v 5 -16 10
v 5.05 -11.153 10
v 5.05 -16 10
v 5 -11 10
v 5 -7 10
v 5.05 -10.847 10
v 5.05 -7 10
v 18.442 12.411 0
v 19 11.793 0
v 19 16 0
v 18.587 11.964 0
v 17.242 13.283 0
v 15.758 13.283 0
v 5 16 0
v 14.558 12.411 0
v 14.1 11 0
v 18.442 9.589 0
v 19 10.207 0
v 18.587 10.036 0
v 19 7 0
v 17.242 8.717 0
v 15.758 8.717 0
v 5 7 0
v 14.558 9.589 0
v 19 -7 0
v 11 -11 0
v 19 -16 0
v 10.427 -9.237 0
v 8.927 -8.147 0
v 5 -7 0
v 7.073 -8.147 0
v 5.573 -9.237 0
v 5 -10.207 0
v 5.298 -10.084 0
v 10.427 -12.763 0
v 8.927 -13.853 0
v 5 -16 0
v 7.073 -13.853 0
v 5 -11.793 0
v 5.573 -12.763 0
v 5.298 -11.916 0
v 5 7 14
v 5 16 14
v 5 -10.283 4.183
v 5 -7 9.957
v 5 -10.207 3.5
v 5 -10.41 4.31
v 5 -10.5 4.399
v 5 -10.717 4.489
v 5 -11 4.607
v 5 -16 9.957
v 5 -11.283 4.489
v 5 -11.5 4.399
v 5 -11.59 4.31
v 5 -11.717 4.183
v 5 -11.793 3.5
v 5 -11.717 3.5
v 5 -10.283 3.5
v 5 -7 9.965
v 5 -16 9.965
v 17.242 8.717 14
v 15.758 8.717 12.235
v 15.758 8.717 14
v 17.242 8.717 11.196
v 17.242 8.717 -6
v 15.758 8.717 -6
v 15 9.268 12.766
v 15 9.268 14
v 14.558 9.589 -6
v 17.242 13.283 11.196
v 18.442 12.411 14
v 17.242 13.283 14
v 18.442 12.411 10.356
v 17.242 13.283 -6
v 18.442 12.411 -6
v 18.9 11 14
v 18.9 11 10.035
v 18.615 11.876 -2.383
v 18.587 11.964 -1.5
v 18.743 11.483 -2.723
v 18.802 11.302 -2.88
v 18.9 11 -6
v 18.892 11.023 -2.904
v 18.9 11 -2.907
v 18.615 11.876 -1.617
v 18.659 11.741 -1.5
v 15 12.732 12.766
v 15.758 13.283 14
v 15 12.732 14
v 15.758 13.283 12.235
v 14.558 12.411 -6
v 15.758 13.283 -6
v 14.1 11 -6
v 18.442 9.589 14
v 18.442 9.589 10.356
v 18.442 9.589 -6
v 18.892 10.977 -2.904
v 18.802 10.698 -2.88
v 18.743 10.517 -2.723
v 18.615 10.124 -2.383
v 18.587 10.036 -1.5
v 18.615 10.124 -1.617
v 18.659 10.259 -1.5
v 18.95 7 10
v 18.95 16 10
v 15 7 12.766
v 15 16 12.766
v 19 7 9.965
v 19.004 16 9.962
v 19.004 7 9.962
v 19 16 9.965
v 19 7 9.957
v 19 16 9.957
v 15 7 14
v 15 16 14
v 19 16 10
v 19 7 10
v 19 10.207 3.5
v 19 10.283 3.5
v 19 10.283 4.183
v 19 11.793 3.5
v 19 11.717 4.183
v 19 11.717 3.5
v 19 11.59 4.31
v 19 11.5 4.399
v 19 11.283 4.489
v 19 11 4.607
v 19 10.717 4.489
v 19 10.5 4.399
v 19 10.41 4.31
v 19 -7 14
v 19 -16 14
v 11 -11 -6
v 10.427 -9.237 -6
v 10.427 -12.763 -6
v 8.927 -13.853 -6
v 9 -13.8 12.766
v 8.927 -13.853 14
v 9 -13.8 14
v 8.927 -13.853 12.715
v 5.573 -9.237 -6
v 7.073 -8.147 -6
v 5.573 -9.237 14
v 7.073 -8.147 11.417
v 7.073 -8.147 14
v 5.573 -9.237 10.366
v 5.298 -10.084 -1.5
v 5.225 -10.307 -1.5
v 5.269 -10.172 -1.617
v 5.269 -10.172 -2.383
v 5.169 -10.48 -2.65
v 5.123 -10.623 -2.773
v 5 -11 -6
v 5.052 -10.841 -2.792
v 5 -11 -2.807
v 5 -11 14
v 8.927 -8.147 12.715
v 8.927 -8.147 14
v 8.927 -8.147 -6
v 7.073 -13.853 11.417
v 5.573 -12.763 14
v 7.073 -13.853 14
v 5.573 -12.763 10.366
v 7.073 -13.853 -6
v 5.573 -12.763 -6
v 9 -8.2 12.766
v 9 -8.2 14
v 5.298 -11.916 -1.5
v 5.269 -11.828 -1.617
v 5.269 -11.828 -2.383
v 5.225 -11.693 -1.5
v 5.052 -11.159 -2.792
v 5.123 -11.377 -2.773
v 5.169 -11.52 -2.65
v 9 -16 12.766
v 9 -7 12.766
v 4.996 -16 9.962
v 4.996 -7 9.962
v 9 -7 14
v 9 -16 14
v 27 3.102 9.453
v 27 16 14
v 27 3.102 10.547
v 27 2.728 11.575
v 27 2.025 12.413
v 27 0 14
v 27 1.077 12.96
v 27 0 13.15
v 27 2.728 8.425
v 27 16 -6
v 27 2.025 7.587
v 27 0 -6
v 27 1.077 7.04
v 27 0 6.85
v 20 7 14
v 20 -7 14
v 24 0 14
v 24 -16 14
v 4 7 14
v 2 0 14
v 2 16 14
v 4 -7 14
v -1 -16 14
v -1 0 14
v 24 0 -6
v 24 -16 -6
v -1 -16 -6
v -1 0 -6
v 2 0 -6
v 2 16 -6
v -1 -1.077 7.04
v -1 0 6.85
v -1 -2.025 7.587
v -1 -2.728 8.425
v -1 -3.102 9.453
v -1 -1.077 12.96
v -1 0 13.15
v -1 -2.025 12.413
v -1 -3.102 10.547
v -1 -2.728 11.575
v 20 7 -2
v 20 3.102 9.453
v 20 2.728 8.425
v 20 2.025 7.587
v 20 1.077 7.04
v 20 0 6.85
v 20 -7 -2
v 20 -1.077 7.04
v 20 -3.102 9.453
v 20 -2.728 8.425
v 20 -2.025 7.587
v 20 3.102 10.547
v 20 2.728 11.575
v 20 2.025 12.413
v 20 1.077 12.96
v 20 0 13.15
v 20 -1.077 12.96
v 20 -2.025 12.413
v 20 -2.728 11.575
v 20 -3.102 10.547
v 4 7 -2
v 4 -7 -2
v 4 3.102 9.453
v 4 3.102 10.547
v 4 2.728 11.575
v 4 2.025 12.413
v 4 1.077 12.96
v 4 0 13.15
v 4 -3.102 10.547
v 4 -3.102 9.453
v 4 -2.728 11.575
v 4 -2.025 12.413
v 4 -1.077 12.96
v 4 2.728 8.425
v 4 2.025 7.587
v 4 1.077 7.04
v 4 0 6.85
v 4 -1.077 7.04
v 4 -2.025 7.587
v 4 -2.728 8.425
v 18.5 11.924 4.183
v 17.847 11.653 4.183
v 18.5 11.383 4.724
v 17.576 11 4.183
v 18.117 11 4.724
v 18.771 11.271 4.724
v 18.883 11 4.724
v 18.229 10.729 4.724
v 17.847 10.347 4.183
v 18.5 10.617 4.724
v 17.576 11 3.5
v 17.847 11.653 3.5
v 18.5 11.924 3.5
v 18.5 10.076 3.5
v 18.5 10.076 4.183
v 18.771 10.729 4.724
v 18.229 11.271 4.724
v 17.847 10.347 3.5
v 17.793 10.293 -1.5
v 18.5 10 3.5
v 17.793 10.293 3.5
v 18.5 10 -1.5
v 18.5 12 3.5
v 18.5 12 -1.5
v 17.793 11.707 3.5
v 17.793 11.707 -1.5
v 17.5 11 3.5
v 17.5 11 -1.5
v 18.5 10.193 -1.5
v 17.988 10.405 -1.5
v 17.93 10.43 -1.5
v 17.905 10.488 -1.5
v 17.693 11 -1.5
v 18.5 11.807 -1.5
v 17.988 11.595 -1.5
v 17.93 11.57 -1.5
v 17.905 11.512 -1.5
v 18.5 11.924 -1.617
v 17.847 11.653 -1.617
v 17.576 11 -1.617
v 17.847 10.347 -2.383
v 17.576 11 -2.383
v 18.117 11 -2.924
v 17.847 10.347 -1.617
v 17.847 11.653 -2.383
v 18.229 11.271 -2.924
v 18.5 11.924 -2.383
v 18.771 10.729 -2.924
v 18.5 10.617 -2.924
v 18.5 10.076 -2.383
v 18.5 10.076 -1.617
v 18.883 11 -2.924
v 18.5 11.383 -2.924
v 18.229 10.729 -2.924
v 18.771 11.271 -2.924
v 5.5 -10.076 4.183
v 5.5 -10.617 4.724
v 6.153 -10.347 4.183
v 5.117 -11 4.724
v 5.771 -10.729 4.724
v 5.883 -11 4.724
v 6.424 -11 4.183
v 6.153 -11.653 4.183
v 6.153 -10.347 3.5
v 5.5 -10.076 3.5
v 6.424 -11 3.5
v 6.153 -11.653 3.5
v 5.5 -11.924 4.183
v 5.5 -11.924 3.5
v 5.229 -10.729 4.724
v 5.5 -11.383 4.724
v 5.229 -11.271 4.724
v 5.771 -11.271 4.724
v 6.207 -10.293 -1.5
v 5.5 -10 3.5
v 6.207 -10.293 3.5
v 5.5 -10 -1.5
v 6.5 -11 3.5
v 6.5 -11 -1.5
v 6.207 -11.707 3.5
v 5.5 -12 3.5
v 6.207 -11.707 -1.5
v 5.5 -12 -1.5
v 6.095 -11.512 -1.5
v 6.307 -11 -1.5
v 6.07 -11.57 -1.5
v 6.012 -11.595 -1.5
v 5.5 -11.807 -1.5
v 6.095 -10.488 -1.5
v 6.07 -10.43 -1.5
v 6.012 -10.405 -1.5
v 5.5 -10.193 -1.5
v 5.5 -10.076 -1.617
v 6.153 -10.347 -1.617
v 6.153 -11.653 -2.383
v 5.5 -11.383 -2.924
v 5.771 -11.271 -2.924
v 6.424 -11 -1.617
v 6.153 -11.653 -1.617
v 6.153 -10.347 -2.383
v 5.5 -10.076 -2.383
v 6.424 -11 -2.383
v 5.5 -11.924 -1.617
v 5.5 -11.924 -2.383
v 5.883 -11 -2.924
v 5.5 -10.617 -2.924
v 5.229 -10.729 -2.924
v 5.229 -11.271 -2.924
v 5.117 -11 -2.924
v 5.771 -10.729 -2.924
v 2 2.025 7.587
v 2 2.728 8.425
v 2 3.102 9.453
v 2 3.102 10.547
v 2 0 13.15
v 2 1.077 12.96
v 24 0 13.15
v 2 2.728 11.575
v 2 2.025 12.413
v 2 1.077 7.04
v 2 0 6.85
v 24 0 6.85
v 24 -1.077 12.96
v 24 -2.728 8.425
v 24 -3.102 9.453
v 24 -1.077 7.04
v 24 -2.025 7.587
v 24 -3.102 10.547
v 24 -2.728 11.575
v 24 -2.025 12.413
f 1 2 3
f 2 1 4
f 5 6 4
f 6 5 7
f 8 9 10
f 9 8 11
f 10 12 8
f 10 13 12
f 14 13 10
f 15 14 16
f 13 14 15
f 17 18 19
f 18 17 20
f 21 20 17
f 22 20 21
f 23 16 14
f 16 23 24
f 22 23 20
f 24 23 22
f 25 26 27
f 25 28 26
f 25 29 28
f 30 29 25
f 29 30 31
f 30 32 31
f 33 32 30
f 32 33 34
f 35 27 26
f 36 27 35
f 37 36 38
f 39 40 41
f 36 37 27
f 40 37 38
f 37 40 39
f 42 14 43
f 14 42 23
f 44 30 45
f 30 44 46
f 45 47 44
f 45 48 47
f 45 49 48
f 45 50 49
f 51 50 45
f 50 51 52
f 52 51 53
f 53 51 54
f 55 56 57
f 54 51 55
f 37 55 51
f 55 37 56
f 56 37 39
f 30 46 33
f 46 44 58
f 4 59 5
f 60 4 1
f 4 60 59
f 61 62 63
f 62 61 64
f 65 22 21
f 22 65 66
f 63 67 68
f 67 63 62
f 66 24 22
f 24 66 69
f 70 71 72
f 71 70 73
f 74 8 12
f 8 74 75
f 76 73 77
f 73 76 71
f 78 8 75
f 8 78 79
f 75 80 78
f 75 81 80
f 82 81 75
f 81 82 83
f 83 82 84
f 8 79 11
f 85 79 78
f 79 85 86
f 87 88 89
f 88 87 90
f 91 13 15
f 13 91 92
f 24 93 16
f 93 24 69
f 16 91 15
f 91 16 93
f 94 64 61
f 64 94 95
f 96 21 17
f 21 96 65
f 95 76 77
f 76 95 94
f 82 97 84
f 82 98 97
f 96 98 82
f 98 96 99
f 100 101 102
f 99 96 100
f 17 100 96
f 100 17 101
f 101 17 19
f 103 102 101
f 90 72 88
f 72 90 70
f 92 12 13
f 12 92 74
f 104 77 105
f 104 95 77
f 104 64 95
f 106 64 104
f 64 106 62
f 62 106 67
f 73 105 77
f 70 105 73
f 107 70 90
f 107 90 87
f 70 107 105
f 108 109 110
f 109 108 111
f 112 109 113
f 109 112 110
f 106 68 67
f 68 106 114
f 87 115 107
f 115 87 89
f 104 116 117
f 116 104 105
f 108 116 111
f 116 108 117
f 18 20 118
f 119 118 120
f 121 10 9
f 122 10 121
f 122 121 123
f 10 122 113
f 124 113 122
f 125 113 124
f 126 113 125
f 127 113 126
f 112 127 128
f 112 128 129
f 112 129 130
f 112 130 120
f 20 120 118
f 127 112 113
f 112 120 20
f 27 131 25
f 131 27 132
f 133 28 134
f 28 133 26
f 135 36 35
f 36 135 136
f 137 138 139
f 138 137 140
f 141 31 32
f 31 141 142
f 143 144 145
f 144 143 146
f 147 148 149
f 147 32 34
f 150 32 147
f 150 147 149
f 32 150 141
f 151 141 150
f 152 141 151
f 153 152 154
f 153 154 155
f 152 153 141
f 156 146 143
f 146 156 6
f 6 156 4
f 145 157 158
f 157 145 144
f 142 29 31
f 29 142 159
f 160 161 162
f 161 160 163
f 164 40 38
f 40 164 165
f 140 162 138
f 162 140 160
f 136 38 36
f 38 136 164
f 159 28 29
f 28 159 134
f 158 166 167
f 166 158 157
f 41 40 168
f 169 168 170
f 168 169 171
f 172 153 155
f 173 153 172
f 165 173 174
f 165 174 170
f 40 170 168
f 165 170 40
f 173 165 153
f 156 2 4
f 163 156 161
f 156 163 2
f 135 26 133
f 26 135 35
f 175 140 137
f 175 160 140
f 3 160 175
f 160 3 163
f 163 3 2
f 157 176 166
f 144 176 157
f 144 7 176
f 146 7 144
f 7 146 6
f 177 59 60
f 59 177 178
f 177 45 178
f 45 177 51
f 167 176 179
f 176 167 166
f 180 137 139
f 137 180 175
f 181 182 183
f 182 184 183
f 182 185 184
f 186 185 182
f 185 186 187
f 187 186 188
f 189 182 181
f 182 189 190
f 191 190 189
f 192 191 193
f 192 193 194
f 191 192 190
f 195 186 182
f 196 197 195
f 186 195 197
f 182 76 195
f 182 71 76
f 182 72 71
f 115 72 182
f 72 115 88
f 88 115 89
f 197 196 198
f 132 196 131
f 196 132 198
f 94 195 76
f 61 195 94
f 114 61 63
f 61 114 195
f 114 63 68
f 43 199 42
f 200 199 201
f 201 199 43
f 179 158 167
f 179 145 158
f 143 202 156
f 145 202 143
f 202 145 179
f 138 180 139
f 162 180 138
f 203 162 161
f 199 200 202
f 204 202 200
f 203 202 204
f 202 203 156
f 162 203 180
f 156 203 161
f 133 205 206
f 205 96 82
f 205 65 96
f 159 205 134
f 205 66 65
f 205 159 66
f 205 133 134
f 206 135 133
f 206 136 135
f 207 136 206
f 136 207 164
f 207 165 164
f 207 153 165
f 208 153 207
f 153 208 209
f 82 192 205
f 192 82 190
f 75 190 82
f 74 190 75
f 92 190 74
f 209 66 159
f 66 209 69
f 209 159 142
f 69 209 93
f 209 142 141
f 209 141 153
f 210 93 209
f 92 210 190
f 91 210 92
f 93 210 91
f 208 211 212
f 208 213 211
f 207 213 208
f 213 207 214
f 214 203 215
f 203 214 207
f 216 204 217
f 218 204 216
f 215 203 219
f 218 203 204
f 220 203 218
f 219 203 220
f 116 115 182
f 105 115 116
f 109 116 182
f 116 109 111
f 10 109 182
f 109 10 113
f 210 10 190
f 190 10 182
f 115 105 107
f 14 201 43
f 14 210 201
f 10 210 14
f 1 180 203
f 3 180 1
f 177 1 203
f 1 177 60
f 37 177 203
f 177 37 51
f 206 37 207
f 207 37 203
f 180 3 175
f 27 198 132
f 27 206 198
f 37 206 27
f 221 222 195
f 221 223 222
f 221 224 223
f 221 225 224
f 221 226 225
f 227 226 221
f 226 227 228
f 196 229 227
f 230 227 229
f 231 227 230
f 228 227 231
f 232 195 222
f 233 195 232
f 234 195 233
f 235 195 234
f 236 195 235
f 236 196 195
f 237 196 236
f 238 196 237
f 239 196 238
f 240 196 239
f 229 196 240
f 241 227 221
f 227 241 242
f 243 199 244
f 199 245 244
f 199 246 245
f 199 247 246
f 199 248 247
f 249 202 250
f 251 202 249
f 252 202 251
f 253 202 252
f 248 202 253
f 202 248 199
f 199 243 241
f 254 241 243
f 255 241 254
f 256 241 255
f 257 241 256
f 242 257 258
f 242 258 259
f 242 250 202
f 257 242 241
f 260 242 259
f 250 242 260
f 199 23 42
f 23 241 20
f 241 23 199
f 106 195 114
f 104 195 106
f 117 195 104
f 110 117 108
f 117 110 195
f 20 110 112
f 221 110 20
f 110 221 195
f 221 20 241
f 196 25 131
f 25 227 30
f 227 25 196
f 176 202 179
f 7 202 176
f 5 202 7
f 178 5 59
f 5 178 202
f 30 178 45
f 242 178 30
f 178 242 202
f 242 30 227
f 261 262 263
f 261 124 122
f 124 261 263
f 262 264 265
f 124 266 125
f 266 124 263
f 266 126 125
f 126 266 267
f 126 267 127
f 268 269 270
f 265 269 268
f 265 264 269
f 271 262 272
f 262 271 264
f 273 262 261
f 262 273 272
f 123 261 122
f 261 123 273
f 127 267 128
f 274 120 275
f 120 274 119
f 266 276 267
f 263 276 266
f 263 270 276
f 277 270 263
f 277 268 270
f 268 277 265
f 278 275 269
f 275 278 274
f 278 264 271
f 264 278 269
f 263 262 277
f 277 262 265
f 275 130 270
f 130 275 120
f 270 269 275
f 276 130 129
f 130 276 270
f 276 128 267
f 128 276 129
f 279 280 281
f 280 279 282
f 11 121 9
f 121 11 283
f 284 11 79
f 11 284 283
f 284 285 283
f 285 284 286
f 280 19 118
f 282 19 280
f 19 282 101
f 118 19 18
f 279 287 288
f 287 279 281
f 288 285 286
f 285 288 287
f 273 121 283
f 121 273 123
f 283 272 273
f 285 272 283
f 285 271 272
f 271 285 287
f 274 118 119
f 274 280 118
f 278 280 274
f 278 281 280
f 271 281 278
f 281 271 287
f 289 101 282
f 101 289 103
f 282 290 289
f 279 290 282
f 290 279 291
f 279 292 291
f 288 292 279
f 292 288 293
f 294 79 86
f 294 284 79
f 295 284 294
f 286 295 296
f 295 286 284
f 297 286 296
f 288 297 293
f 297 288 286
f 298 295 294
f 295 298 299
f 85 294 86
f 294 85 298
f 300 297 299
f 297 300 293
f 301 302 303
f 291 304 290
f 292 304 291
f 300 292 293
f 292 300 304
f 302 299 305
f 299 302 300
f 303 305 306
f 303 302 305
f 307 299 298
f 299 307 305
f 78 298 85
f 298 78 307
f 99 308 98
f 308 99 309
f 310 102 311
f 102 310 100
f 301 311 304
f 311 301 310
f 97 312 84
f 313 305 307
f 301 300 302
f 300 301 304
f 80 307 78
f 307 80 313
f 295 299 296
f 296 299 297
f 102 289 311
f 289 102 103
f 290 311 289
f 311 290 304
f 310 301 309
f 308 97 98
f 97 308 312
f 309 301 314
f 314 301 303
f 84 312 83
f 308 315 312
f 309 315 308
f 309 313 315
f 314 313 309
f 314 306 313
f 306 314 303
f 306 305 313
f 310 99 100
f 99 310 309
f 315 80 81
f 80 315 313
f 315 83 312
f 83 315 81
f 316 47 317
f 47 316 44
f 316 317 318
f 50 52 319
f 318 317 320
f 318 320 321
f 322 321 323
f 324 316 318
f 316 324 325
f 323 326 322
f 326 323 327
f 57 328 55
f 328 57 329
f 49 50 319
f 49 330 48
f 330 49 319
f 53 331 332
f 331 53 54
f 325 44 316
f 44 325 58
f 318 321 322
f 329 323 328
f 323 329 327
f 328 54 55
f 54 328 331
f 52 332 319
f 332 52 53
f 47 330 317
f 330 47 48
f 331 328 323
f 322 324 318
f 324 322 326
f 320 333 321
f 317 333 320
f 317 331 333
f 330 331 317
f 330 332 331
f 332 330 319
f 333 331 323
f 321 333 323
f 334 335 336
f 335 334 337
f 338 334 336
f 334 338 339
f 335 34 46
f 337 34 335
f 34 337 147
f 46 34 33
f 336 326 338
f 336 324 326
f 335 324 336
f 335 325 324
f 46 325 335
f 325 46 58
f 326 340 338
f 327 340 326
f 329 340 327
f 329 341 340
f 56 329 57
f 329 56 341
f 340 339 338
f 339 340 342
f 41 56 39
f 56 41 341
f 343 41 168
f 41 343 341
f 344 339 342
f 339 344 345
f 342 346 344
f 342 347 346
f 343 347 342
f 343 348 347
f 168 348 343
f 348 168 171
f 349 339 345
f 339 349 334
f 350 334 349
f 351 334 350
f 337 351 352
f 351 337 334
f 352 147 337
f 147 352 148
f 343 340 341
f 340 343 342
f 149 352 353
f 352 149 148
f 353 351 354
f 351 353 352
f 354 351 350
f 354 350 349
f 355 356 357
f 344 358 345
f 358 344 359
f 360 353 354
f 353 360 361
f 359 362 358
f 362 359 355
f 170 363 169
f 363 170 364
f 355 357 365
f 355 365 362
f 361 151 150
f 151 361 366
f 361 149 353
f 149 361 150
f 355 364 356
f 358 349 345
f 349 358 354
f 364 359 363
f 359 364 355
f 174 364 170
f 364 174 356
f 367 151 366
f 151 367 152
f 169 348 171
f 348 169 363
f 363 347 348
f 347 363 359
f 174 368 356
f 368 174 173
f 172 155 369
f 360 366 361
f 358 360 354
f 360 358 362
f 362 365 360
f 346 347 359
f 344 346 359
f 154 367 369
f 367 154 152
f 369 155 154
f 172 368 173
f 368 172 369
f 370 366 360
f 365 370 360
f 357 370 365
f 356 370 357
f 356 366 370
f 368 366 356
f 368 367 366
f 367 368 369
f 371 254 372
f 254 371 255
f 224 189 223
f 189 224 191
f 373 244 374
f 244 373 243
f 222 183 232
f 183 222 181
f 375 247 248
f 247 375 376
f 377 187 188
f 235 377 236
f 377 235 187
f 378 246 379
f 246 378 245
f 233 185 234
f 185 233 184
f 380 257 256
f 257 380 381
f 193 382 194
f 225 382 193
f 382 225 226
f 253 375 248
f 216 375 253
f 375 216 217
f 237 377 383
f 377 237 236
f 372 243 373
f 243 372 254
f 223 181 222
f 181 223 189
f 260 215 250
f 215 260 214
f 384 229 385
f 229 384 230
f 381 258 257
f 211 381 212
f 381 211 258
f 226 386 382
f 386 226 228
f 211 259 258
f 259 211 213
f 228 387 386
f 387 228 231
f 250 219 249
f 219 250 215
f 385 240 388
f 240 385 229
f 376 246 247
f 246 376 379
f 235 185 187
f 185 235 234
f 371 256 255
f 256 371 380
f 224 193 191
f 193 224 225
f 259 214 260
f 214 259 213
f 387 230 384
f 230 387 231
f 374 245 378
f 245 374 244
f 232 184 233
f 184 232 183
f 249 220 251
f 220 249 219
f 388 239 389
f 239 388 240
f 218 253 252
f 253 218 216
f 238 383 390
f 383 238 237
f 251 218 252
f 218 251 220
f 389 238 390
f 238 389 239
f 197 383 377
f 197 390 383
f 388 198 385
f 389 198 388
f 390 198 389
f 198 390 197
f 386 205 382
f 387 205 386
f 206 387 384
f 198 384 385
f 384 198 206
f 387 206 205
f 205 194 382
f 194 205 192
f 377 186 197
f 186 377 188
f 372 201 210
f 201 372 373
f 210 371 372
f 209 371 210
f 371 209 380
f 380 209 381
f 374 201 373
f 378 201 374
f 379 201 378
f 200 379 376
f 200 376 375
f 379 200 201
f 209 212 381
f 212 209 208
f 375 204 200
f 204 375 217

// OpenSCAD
module blockr(len, wid, ht, slot, n) {
   tuber = 3;
   stuber = 2.4;
   yoff = 11;
	difference() { 
      translate([len/2-1,0,4])
         cube([len,wid,ht],center=true);
      translate([3*slot/2,0,7])
         cube([16,14,18],center=true);
  
		ssection(slot,wid,ht,stuber,n,yoff);
      translate([3*slot,0,0])
        mirror([1,0,0])
		    section(slot,wid,ht,tuber,n,-yoff);
   }
   translate([0,4,0])
//   wedge(slot,wid,ht,tuber,n,yoff-1.5);
//   translate([3*slot,0,0])
//     mirror([1,0,0])
//        wedge(slot,wid,ht,tuber,n,-yoff-1.5);
translate([0,0,2])
   pip(slot,wid,ht,3,n, 0.5+slot/2, yoff-4);
translate([0,0,2])
   pip(slot,wid,ht,3,n, -(slot/2+3*tuber/2), -yoff);
			
}

module section(slot,wid,ht,tuber, n,yoff) {
		translate([2*n*slot-(7*slot)/8,yoff,5])
			cube([slot,4*wid,ht/2], center=true);
   	translate([2*n*slot,yoff,ht/3])
         cylinder(r=tuber,h=3*ht,center=true,$fn=10);
      translate([2*n*slot-2.28,yoff,ht/2])
         rotate([0,35,0])
           cube([8.7,12,6], center=true);
      translate([2*n*slot-6,yoff,ht/2])
           cube([10,12,10], center=true);
}
module ssection(slot,wid,ht,tuber, n,yoff) {
		translate([2*n*slot-(7*slot)/8,yoff,5])
			cube([slot,4*wid,ht/2], center=true);
   	translate([2*n*slot+0.5,yoff,ht/3])
         cylinder(r=tuber,h=3*ht,center=true,$fn=10);
      translate([2*n*slot-2.28,yoff,ht/2])
         rotate([0,35,0])
           cube([8.7,12,6], center=true);
      translate([2*n*slot-6,yoff,ht/2])
           cube([10,12,10], center=true);
}
module wedge(slot,wid,ht,tuber,n,yoff) {

  difference() {
		translate([2*n*slot+4,yoff,-8])
          cube([10,9,6],center=true);
		translate([2*n*slot-slot+1,yoff,3])
          rotate([0,45,0]) cube([18,10,12],center=true);
		translate([2*n*slot,yoff+1.5,0])
          cylinder(r=tuber,h=3*ht,center=true);
		translate([2*n*slot,yoff+6,3])
          cube([2*tuber,2*tuber,2*tuber],center=true);
  }
}


module pip(slot,wid,ht,tuber,n, xoff, yoff) {
       translate([xoff+2*n*slot-tuber/2-0.5,yoff,1.8])
         sphere(tuber/3,center=true,$fn=8);

   	translate([xoff+2*n*slot-tuber/2-0.5,yoff,-1])
         cylinder(r=tuber/3,h=1+ht/5,center=true,$fn=8);


       translate([xoff+2*n*slot-tuber/2-0.5,yoff,-4])
         sphere(tuber/3,center=true,$fn=8);
}
difference() {
   blockr(28,32,20,8,1 );
   translate([20,0,10])
        rotate([0,90,0]) cylinder(r=3.15,h=70,center=true,$fn=18);
   translate([28,-17,0]) cube([8,34,32], center=true);
   translate([-2,17,0])  cube([8,34,32], center=true);
}
